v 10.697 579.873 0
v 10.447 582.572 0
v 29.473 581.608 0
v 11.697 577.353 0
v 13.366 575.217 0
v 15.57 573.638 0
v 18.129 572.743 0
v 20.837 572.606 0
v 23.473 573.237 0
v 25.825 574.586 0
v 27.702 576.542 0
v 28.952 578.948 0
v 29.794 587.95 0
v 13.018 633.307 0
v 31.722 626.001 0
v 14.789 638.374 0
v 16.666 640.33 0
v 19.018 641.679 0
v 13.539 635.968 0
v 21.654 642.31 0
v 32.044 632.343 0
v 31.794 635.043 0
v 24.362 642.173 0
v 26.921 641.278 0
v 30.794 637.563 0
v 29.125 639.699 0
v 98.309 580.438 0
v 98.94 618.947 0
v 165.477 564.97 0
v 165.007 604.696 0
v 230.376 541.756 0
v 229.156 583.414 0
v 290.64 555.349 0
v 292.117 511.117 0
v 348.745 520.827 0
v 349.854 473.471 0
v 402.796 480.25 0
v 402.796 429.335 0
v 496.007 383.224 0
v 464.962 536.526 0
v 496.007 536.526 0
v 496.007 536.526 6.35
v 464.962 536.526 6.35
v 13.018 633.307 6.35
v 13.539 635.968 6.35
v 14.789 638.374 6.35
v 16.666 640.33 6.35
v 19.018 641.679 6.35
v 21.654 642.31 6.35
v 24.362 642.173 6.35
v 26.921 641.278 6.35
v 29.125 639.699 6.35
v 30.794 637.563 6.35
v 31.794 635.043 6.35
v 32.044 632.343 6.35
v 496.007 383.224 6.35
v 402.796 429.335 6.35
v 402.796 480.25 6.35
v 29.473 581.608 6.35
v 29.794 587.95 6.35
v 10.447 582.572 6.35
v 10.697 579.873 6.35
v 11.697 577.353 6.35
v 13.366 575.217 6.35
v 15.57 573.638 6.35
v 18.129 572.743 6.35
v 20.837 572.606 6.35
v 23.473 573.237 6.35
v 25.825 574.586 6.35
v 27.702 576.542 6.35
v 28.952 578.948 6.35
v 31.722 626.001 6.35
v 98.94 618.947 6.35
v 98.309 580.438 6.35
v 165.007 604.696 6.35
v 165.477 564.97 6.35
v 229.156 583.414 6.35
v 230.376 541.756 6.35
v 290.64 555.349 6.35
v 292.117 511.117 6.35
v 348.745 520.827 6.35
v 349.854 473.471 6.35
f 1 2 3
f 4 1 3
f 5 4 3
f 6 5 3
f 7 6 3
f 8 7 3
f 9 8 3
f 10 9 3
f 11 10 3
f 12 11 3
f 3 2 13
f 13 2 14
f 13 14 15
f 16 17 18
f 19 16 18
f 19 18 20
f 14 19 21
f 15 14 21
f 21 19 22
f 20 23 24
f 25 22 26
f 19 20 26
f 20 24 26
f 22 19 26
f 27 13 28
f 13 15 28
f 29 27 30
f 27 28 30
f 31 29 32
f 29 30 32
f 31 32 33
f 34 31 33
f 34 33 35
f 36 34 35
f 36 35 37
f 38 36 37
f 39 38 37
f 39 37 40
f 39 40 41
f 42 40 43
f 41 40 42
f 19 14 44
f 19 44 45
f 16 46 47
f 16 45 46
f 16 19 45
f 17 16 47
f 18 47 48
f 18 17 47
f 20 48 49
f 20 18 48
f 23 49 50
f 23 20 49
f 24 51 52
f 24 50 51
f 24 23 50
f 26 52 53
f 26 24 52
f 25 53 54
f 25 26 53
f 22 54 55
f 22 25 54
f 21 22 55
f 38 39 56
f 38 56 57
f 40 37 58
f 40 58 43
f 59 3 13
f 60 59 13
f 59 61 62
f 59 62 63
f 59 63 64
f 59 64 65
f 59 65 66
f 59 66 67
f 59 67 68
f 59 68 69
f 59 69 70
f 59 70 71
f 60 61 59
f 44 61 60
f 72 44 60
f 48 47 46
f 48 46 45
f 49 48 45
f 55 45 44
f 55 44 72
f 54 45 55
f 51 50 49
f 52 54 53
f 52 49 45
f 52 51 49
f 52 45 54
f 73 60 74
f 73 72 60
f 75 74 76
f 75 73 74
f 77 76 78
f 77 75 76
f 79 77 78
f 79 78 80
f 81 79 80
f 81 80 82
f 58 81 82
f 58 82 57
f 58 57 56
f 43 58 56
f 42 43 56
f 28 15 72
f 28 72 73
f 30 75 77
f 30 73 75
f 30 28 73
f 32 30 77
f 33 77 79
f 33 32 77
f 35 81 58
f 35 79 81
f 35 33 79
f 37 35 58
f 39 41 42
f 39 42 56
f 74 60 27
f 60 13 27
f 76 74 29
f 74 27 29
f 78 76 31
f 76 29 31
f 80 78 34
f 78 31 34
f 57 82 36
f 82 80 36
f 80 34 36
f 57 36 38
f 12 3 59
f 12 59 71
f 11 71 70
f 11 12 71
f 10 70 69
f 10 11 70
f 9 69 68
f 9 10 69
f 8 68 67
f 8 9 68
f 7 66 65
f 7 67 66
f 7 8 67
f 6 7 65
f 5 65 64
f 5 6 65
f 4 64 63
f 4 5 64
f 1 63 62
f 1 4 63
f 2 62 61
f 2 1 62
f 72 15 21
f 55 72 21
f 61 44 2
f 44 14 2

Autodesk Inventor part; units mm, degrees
ref_plane "YZ Plane" through (0, 0, 0) normal (1, 0, 0) x (0, 1, 0)
ref_plane "XZ Plane" through (0, 0, 0) normal (0, 1, 0) x (-1, 0, 0)
ref_plane "XY Plane" through (0, 0, 0) normal (0, 0, 1) x (1, 0, 0)
sketch "Sketch1" plane through (0, 0, 0) normal (0, 0, 1) x (1, 0, 0)
  arc A0 (402.7957, 429.3353) -> (29.7943, 587.9503) centre (0, 0) ccw
  arc A1 (428.864, 457.1212) -> (31.7225, 626.0014) centre (0, 0) ccw
  line L0 (31.7225, 626.0014) -> (32.0439, 632.3433)
  arc A2 (32.0439, 632.3433) -> (13.0183, 633.3074) centre (22.5311, 632.8254) ccw
  line L1 (13.0183, 633.3074) -> (10.4473, 582.5725)
  arc A3 (10.4473, 582.5725) -> (29.4729, 581.6084) centre (19.9601, 582.0905) ccw
  line L2 (29.4729, 581.6084) -> (29.7943, 587.9503)
  line L3 (402.7957, 480.2497) -> (464.9618, 536.5258)
  line L4 (464.9618, 536.5258) -> (496.0072, 536.5258)
  line L5 (496.0072, 536.5258) -> (496.0072, 383.2245)
  line L6 (496.0072, 383.2245) -> (402.7957, 429.3353)
  point P0 (0, 0)
  dimension "d0" = 588.7047
  dimension "d1" = 38.1
  dimension "d2" = 9.525
  dimension "d3" = 50.8
extrude "Extrusion1" add sketch "Sketch1" along normal blind 6.35
properties part number "PLATE,SIDE,RACK,INTAKE"
